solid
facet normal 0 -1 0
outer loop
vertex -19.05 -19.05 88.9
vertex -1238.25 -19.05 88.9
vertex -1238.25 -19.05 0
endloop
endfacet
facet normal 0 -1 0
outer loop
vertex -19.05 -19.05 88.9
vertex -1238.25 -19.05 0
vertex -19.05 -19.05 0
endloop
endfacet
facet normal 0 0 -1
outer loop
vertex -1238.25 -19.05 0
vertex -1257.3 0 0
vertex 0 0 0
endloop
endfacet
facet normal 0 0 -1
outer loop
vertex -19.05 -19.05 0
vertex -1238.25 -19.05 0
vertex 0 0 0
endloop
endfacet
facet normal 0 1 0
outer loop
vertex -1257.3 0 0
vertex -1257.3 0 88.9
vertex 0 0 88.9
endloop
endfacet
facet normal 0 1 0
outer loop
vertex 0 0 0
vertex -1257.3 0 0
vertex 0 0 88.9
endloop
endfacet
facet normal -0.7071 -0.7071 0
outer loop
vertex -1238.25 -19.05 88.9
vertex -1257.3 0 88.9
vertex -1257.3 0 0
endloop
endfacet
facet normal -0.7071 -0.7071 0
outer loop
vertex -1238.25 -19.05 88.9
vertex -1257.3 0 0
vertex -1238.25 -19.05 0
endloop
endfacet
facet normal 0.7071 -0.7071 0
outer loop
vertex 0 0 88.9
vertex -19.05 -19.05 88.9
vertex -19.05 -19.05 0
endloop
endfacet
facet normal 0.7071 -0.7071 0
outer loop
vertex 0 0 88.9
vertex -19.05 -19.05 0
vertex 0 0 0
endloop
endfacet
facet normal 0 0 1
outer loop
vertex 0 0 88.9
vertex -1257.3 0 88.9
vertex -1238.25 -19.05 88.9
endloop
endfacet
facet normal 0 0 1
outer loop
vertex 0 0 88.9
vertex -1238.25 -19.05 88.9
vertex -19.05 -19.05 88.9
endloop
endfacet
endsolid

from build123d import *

# Parameters (mm, degrees)
F0_W     = 1257.3
F0_H     = 88.9
F1_DEPTH = 19.05
F3_DEPTH = 127
F5_DEPTH = 127


with BuildPart() as f1:
    # F0 (on Front) → F1 (new body)
    with BuildSketch(Plane.XZ):
        with Locations((-628.65, 44.45)):
            Rectangle(F0_W, F0_H)
    extrude(amount=F1_DEPTH)

    # F2 (on face) → F3 (cut)
    with BuildSketch(Plane(origin=(0, 0, 0), x_dir=(1, 0, 0), z_dir=(0, 0, -1))):
        Polygon((-1257.3, 19.05), (-1257.3, 0), (-1238.25, 19.05), align=None)
    extrude(amount=-F3_DEPTH, mode=Mode.SUBTRACT)

    # F4 (on face) → F5 (cut)
    with BuildSketch(Plane(origin=(0, 0, 0), x_dir=(1, 0, 0), z_dir=(0, 0, -1))):
        Polygon((-19.05, 19.05), (0, 0), (0, 19.05), align=None)
    extrude(amount=-F5_DEPTH, mode=Mode.SUBTRACT)


solid = f1.part
